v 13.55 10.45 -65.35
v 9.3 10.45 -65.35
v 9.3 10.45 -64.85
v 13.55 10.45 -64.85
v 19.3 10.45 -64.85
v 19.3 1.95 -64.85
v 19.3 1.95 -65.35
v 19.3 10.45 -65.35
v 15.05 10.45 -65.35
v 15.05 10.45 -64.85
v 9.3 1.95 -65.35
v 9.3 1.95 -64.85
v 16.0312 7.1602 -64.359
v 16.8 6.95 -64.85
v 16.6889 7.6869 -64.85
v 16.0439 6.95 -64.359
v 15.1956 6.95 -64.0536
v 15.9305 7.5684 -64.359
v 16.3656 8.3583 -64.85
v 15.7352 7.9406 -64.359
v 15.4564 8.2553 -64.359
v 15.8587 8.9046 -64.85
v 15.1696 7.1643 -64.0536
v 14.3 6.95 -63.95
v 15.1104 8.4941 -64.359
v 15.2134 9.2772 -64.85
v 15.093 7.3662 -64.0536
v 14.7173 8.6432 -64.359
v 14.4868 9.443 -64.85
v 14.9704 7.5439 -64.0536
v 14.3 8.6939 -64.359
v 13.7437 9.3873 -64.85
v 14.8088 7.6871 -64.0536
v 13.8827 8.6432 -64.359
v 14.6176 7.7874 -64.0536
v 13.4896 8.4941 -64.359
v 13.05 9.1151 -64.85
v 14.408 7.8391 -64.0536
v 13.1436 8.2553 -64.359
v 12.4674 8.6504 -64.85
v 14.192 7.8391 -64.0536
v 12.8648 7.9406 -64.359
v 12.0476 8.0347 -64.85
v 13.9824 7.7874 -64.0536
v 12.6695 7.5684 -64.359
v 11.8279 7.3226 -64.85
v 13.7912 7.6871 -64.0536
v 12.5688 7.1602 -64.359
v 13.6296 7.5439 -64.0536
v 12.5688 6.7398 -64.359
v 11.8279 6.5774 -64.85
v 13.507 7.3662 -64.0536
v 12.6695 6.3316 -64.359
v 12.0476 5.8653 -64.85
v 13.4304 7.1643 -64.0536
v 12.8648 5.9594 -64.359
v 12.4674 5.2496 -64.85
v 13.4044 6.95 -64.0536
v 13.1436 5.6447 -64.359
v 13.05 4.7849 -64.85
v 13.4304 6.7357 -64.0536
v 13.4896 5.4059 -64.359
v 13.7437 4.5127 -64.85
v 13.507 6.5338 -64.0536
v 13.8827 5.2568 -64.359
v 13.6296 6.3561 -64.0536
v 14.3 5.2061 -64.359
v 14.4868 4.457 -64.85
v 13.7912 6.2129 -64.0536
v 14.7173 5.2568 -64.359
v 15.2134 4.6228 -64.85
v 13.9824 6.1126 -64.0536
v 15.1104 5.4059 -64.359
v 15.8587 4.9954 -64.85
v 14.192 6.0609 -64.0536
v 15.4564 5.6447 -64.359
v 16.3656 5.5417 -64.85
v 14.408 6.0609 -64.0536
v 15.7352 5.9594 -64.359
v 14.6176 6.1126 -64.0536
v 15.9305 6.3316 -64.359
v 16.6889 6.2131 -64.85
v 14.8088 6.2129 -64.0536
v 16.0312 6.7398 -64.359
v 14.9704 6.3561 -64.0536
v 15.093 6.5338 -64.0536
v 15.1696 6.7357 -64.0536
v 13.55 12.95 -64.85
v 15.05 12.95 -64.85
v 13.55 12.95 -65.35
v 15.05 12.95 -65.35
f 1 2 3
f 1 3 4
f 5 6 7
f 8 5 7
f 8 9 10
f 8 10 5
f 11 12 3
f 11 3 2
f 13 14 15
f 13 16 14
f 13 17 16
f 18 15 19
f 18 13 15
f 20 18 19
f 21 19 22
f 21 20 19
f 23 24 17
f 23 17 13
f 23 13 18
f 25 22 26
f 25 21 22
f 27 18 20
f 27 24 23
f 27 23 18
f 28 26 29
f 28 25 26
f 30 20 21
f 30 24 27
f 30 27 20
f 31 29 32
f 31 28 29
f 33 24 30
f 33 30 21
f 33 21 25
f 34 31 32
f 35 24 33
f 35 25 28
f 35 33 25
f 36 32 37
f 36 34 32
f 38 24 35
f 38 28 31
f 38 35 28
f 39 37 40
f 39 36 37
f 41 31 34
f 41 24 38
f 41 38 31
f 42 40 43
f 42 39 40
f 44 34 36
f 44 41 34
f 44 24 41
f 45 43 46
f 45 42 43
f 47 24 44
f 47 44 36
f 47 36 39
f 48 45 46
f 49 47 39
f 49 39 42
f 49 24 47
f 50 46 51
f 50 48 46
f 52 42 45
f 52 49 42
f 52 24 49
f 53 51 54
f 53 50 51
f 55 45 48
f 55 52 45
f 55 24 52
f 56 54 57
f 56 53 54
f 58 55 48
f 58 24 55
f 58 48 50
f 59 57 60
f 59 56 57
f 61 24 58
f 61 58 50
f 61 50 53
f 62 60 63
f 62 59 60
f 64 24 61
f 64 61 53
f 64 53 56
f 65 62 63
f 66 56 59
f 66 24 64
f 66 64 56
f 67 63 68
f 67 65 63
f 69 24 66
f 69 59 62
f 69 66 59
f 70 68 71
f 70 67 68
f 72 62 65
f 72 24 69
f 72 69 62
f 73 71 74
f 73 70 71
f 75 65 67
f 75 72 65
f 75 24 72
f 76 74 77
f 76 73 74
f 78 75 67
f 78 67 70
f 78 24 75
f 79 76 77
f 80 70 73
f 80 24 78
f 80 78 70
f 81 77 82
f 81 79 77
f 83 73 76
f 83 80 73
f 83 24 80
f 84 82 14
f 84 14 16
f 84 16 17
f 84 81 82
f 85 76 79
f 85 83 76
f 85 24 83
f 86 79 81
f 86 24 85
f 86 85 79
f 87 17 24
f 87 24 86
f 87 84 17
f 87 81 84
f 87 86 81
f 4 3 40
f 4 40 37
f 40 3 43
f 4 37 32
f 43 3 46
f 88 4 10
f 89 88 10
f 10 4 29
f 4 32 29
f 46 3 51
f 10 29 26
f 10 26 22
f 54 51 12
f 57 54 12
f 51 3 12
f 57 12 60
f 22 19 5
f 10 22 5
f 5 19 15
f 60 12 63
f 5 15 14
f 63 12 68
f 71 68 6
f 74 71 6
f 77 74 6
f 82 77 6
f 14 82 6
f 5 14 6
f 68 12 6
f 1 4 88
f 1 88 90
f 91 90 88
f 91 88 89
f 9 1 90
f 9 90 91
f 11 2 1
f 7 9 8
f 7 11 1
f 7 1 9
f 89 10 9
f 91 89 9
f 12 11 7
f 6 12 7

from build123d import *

# Parameters (mm, degrees)
PLUS_PLATE_10_X_8_5_X_0_5_SKETCH_W = 10
PLUS_PLATE_10_X_8_5_X_0_5_SKETCH_H = 0.5
PLUS_PLATE_10_X_8_5_X_0_5_DEPTH    = 8.5
SOLDER_TAB_1_5_X_2_5_SKETCH_W      = 1.5
SOLDER_TAB_1_5_X_2_5_SKETCH_H      = 0.5
SOLDER_TAB_1_5_X_2_5_DEPTH         = 2.5


with BuildPart() as part:
    # Plus Plate 10 x 8.5 x 0.5 Sketch → Plus Plate 10 x 8.5 x 0.5 (new body)
    with BuildSketch(Plane(origin=(0, 1.95, 0), x_dir=(1, 0, 0), z_dir=(0, 1, 0))):
        with Locations((14.3, 65.1)):
            Rectangle(PLUS_PLATE_10_X_8_5_X_0_5_SKETCH_W, PLUS_PLATE_10_X_8_5_X_0_5_SKETCH_H)
    extrude(amount=PLUS_PLATE_10_X_8_5_X_0_5_DEPTH)

    # Solder Tab 1.5 x 2.5 Sketch → Solder Tab 1.5 x 2.5 (add)
    with BuildSketch(Plane(origin=(0, 10.45, 0), x_dir=(1, 0, 0), z_dir=(0, 1, 0))):
        with Locations((14.3, 65.1)):
            Rectangle(SOLDER_TAB_1_5_X_2_5_SKETCH_W, SOLDER_TAB_1_5_X_2_5_SKETCH_H)
    extrude(amount=SOLDER_TAB_1_5_X_2_5_DEPTH)

    # Dimple 0.9 Sketch → Dimple 0.9 (revolve)
    with BuildSketch(Plane(origin=(0, 6.95, 0), x_dir=(1, 0, 0), z_dir=(0, 1, 0))):
        with BuildLine():
            Line((14.3, 64.85), (16.8, 64.85))
            ThreePointArc((16.8, 64.85), (15.628533026, 64.181852707), (14.3, 63.95))
            Line((14.3, 63.95), (14.3, 64.85))
        make_face()
    revolve(axis=Axis((14.3, 6.95, -65.85), (0, 0, 1)))


solid = part.part
